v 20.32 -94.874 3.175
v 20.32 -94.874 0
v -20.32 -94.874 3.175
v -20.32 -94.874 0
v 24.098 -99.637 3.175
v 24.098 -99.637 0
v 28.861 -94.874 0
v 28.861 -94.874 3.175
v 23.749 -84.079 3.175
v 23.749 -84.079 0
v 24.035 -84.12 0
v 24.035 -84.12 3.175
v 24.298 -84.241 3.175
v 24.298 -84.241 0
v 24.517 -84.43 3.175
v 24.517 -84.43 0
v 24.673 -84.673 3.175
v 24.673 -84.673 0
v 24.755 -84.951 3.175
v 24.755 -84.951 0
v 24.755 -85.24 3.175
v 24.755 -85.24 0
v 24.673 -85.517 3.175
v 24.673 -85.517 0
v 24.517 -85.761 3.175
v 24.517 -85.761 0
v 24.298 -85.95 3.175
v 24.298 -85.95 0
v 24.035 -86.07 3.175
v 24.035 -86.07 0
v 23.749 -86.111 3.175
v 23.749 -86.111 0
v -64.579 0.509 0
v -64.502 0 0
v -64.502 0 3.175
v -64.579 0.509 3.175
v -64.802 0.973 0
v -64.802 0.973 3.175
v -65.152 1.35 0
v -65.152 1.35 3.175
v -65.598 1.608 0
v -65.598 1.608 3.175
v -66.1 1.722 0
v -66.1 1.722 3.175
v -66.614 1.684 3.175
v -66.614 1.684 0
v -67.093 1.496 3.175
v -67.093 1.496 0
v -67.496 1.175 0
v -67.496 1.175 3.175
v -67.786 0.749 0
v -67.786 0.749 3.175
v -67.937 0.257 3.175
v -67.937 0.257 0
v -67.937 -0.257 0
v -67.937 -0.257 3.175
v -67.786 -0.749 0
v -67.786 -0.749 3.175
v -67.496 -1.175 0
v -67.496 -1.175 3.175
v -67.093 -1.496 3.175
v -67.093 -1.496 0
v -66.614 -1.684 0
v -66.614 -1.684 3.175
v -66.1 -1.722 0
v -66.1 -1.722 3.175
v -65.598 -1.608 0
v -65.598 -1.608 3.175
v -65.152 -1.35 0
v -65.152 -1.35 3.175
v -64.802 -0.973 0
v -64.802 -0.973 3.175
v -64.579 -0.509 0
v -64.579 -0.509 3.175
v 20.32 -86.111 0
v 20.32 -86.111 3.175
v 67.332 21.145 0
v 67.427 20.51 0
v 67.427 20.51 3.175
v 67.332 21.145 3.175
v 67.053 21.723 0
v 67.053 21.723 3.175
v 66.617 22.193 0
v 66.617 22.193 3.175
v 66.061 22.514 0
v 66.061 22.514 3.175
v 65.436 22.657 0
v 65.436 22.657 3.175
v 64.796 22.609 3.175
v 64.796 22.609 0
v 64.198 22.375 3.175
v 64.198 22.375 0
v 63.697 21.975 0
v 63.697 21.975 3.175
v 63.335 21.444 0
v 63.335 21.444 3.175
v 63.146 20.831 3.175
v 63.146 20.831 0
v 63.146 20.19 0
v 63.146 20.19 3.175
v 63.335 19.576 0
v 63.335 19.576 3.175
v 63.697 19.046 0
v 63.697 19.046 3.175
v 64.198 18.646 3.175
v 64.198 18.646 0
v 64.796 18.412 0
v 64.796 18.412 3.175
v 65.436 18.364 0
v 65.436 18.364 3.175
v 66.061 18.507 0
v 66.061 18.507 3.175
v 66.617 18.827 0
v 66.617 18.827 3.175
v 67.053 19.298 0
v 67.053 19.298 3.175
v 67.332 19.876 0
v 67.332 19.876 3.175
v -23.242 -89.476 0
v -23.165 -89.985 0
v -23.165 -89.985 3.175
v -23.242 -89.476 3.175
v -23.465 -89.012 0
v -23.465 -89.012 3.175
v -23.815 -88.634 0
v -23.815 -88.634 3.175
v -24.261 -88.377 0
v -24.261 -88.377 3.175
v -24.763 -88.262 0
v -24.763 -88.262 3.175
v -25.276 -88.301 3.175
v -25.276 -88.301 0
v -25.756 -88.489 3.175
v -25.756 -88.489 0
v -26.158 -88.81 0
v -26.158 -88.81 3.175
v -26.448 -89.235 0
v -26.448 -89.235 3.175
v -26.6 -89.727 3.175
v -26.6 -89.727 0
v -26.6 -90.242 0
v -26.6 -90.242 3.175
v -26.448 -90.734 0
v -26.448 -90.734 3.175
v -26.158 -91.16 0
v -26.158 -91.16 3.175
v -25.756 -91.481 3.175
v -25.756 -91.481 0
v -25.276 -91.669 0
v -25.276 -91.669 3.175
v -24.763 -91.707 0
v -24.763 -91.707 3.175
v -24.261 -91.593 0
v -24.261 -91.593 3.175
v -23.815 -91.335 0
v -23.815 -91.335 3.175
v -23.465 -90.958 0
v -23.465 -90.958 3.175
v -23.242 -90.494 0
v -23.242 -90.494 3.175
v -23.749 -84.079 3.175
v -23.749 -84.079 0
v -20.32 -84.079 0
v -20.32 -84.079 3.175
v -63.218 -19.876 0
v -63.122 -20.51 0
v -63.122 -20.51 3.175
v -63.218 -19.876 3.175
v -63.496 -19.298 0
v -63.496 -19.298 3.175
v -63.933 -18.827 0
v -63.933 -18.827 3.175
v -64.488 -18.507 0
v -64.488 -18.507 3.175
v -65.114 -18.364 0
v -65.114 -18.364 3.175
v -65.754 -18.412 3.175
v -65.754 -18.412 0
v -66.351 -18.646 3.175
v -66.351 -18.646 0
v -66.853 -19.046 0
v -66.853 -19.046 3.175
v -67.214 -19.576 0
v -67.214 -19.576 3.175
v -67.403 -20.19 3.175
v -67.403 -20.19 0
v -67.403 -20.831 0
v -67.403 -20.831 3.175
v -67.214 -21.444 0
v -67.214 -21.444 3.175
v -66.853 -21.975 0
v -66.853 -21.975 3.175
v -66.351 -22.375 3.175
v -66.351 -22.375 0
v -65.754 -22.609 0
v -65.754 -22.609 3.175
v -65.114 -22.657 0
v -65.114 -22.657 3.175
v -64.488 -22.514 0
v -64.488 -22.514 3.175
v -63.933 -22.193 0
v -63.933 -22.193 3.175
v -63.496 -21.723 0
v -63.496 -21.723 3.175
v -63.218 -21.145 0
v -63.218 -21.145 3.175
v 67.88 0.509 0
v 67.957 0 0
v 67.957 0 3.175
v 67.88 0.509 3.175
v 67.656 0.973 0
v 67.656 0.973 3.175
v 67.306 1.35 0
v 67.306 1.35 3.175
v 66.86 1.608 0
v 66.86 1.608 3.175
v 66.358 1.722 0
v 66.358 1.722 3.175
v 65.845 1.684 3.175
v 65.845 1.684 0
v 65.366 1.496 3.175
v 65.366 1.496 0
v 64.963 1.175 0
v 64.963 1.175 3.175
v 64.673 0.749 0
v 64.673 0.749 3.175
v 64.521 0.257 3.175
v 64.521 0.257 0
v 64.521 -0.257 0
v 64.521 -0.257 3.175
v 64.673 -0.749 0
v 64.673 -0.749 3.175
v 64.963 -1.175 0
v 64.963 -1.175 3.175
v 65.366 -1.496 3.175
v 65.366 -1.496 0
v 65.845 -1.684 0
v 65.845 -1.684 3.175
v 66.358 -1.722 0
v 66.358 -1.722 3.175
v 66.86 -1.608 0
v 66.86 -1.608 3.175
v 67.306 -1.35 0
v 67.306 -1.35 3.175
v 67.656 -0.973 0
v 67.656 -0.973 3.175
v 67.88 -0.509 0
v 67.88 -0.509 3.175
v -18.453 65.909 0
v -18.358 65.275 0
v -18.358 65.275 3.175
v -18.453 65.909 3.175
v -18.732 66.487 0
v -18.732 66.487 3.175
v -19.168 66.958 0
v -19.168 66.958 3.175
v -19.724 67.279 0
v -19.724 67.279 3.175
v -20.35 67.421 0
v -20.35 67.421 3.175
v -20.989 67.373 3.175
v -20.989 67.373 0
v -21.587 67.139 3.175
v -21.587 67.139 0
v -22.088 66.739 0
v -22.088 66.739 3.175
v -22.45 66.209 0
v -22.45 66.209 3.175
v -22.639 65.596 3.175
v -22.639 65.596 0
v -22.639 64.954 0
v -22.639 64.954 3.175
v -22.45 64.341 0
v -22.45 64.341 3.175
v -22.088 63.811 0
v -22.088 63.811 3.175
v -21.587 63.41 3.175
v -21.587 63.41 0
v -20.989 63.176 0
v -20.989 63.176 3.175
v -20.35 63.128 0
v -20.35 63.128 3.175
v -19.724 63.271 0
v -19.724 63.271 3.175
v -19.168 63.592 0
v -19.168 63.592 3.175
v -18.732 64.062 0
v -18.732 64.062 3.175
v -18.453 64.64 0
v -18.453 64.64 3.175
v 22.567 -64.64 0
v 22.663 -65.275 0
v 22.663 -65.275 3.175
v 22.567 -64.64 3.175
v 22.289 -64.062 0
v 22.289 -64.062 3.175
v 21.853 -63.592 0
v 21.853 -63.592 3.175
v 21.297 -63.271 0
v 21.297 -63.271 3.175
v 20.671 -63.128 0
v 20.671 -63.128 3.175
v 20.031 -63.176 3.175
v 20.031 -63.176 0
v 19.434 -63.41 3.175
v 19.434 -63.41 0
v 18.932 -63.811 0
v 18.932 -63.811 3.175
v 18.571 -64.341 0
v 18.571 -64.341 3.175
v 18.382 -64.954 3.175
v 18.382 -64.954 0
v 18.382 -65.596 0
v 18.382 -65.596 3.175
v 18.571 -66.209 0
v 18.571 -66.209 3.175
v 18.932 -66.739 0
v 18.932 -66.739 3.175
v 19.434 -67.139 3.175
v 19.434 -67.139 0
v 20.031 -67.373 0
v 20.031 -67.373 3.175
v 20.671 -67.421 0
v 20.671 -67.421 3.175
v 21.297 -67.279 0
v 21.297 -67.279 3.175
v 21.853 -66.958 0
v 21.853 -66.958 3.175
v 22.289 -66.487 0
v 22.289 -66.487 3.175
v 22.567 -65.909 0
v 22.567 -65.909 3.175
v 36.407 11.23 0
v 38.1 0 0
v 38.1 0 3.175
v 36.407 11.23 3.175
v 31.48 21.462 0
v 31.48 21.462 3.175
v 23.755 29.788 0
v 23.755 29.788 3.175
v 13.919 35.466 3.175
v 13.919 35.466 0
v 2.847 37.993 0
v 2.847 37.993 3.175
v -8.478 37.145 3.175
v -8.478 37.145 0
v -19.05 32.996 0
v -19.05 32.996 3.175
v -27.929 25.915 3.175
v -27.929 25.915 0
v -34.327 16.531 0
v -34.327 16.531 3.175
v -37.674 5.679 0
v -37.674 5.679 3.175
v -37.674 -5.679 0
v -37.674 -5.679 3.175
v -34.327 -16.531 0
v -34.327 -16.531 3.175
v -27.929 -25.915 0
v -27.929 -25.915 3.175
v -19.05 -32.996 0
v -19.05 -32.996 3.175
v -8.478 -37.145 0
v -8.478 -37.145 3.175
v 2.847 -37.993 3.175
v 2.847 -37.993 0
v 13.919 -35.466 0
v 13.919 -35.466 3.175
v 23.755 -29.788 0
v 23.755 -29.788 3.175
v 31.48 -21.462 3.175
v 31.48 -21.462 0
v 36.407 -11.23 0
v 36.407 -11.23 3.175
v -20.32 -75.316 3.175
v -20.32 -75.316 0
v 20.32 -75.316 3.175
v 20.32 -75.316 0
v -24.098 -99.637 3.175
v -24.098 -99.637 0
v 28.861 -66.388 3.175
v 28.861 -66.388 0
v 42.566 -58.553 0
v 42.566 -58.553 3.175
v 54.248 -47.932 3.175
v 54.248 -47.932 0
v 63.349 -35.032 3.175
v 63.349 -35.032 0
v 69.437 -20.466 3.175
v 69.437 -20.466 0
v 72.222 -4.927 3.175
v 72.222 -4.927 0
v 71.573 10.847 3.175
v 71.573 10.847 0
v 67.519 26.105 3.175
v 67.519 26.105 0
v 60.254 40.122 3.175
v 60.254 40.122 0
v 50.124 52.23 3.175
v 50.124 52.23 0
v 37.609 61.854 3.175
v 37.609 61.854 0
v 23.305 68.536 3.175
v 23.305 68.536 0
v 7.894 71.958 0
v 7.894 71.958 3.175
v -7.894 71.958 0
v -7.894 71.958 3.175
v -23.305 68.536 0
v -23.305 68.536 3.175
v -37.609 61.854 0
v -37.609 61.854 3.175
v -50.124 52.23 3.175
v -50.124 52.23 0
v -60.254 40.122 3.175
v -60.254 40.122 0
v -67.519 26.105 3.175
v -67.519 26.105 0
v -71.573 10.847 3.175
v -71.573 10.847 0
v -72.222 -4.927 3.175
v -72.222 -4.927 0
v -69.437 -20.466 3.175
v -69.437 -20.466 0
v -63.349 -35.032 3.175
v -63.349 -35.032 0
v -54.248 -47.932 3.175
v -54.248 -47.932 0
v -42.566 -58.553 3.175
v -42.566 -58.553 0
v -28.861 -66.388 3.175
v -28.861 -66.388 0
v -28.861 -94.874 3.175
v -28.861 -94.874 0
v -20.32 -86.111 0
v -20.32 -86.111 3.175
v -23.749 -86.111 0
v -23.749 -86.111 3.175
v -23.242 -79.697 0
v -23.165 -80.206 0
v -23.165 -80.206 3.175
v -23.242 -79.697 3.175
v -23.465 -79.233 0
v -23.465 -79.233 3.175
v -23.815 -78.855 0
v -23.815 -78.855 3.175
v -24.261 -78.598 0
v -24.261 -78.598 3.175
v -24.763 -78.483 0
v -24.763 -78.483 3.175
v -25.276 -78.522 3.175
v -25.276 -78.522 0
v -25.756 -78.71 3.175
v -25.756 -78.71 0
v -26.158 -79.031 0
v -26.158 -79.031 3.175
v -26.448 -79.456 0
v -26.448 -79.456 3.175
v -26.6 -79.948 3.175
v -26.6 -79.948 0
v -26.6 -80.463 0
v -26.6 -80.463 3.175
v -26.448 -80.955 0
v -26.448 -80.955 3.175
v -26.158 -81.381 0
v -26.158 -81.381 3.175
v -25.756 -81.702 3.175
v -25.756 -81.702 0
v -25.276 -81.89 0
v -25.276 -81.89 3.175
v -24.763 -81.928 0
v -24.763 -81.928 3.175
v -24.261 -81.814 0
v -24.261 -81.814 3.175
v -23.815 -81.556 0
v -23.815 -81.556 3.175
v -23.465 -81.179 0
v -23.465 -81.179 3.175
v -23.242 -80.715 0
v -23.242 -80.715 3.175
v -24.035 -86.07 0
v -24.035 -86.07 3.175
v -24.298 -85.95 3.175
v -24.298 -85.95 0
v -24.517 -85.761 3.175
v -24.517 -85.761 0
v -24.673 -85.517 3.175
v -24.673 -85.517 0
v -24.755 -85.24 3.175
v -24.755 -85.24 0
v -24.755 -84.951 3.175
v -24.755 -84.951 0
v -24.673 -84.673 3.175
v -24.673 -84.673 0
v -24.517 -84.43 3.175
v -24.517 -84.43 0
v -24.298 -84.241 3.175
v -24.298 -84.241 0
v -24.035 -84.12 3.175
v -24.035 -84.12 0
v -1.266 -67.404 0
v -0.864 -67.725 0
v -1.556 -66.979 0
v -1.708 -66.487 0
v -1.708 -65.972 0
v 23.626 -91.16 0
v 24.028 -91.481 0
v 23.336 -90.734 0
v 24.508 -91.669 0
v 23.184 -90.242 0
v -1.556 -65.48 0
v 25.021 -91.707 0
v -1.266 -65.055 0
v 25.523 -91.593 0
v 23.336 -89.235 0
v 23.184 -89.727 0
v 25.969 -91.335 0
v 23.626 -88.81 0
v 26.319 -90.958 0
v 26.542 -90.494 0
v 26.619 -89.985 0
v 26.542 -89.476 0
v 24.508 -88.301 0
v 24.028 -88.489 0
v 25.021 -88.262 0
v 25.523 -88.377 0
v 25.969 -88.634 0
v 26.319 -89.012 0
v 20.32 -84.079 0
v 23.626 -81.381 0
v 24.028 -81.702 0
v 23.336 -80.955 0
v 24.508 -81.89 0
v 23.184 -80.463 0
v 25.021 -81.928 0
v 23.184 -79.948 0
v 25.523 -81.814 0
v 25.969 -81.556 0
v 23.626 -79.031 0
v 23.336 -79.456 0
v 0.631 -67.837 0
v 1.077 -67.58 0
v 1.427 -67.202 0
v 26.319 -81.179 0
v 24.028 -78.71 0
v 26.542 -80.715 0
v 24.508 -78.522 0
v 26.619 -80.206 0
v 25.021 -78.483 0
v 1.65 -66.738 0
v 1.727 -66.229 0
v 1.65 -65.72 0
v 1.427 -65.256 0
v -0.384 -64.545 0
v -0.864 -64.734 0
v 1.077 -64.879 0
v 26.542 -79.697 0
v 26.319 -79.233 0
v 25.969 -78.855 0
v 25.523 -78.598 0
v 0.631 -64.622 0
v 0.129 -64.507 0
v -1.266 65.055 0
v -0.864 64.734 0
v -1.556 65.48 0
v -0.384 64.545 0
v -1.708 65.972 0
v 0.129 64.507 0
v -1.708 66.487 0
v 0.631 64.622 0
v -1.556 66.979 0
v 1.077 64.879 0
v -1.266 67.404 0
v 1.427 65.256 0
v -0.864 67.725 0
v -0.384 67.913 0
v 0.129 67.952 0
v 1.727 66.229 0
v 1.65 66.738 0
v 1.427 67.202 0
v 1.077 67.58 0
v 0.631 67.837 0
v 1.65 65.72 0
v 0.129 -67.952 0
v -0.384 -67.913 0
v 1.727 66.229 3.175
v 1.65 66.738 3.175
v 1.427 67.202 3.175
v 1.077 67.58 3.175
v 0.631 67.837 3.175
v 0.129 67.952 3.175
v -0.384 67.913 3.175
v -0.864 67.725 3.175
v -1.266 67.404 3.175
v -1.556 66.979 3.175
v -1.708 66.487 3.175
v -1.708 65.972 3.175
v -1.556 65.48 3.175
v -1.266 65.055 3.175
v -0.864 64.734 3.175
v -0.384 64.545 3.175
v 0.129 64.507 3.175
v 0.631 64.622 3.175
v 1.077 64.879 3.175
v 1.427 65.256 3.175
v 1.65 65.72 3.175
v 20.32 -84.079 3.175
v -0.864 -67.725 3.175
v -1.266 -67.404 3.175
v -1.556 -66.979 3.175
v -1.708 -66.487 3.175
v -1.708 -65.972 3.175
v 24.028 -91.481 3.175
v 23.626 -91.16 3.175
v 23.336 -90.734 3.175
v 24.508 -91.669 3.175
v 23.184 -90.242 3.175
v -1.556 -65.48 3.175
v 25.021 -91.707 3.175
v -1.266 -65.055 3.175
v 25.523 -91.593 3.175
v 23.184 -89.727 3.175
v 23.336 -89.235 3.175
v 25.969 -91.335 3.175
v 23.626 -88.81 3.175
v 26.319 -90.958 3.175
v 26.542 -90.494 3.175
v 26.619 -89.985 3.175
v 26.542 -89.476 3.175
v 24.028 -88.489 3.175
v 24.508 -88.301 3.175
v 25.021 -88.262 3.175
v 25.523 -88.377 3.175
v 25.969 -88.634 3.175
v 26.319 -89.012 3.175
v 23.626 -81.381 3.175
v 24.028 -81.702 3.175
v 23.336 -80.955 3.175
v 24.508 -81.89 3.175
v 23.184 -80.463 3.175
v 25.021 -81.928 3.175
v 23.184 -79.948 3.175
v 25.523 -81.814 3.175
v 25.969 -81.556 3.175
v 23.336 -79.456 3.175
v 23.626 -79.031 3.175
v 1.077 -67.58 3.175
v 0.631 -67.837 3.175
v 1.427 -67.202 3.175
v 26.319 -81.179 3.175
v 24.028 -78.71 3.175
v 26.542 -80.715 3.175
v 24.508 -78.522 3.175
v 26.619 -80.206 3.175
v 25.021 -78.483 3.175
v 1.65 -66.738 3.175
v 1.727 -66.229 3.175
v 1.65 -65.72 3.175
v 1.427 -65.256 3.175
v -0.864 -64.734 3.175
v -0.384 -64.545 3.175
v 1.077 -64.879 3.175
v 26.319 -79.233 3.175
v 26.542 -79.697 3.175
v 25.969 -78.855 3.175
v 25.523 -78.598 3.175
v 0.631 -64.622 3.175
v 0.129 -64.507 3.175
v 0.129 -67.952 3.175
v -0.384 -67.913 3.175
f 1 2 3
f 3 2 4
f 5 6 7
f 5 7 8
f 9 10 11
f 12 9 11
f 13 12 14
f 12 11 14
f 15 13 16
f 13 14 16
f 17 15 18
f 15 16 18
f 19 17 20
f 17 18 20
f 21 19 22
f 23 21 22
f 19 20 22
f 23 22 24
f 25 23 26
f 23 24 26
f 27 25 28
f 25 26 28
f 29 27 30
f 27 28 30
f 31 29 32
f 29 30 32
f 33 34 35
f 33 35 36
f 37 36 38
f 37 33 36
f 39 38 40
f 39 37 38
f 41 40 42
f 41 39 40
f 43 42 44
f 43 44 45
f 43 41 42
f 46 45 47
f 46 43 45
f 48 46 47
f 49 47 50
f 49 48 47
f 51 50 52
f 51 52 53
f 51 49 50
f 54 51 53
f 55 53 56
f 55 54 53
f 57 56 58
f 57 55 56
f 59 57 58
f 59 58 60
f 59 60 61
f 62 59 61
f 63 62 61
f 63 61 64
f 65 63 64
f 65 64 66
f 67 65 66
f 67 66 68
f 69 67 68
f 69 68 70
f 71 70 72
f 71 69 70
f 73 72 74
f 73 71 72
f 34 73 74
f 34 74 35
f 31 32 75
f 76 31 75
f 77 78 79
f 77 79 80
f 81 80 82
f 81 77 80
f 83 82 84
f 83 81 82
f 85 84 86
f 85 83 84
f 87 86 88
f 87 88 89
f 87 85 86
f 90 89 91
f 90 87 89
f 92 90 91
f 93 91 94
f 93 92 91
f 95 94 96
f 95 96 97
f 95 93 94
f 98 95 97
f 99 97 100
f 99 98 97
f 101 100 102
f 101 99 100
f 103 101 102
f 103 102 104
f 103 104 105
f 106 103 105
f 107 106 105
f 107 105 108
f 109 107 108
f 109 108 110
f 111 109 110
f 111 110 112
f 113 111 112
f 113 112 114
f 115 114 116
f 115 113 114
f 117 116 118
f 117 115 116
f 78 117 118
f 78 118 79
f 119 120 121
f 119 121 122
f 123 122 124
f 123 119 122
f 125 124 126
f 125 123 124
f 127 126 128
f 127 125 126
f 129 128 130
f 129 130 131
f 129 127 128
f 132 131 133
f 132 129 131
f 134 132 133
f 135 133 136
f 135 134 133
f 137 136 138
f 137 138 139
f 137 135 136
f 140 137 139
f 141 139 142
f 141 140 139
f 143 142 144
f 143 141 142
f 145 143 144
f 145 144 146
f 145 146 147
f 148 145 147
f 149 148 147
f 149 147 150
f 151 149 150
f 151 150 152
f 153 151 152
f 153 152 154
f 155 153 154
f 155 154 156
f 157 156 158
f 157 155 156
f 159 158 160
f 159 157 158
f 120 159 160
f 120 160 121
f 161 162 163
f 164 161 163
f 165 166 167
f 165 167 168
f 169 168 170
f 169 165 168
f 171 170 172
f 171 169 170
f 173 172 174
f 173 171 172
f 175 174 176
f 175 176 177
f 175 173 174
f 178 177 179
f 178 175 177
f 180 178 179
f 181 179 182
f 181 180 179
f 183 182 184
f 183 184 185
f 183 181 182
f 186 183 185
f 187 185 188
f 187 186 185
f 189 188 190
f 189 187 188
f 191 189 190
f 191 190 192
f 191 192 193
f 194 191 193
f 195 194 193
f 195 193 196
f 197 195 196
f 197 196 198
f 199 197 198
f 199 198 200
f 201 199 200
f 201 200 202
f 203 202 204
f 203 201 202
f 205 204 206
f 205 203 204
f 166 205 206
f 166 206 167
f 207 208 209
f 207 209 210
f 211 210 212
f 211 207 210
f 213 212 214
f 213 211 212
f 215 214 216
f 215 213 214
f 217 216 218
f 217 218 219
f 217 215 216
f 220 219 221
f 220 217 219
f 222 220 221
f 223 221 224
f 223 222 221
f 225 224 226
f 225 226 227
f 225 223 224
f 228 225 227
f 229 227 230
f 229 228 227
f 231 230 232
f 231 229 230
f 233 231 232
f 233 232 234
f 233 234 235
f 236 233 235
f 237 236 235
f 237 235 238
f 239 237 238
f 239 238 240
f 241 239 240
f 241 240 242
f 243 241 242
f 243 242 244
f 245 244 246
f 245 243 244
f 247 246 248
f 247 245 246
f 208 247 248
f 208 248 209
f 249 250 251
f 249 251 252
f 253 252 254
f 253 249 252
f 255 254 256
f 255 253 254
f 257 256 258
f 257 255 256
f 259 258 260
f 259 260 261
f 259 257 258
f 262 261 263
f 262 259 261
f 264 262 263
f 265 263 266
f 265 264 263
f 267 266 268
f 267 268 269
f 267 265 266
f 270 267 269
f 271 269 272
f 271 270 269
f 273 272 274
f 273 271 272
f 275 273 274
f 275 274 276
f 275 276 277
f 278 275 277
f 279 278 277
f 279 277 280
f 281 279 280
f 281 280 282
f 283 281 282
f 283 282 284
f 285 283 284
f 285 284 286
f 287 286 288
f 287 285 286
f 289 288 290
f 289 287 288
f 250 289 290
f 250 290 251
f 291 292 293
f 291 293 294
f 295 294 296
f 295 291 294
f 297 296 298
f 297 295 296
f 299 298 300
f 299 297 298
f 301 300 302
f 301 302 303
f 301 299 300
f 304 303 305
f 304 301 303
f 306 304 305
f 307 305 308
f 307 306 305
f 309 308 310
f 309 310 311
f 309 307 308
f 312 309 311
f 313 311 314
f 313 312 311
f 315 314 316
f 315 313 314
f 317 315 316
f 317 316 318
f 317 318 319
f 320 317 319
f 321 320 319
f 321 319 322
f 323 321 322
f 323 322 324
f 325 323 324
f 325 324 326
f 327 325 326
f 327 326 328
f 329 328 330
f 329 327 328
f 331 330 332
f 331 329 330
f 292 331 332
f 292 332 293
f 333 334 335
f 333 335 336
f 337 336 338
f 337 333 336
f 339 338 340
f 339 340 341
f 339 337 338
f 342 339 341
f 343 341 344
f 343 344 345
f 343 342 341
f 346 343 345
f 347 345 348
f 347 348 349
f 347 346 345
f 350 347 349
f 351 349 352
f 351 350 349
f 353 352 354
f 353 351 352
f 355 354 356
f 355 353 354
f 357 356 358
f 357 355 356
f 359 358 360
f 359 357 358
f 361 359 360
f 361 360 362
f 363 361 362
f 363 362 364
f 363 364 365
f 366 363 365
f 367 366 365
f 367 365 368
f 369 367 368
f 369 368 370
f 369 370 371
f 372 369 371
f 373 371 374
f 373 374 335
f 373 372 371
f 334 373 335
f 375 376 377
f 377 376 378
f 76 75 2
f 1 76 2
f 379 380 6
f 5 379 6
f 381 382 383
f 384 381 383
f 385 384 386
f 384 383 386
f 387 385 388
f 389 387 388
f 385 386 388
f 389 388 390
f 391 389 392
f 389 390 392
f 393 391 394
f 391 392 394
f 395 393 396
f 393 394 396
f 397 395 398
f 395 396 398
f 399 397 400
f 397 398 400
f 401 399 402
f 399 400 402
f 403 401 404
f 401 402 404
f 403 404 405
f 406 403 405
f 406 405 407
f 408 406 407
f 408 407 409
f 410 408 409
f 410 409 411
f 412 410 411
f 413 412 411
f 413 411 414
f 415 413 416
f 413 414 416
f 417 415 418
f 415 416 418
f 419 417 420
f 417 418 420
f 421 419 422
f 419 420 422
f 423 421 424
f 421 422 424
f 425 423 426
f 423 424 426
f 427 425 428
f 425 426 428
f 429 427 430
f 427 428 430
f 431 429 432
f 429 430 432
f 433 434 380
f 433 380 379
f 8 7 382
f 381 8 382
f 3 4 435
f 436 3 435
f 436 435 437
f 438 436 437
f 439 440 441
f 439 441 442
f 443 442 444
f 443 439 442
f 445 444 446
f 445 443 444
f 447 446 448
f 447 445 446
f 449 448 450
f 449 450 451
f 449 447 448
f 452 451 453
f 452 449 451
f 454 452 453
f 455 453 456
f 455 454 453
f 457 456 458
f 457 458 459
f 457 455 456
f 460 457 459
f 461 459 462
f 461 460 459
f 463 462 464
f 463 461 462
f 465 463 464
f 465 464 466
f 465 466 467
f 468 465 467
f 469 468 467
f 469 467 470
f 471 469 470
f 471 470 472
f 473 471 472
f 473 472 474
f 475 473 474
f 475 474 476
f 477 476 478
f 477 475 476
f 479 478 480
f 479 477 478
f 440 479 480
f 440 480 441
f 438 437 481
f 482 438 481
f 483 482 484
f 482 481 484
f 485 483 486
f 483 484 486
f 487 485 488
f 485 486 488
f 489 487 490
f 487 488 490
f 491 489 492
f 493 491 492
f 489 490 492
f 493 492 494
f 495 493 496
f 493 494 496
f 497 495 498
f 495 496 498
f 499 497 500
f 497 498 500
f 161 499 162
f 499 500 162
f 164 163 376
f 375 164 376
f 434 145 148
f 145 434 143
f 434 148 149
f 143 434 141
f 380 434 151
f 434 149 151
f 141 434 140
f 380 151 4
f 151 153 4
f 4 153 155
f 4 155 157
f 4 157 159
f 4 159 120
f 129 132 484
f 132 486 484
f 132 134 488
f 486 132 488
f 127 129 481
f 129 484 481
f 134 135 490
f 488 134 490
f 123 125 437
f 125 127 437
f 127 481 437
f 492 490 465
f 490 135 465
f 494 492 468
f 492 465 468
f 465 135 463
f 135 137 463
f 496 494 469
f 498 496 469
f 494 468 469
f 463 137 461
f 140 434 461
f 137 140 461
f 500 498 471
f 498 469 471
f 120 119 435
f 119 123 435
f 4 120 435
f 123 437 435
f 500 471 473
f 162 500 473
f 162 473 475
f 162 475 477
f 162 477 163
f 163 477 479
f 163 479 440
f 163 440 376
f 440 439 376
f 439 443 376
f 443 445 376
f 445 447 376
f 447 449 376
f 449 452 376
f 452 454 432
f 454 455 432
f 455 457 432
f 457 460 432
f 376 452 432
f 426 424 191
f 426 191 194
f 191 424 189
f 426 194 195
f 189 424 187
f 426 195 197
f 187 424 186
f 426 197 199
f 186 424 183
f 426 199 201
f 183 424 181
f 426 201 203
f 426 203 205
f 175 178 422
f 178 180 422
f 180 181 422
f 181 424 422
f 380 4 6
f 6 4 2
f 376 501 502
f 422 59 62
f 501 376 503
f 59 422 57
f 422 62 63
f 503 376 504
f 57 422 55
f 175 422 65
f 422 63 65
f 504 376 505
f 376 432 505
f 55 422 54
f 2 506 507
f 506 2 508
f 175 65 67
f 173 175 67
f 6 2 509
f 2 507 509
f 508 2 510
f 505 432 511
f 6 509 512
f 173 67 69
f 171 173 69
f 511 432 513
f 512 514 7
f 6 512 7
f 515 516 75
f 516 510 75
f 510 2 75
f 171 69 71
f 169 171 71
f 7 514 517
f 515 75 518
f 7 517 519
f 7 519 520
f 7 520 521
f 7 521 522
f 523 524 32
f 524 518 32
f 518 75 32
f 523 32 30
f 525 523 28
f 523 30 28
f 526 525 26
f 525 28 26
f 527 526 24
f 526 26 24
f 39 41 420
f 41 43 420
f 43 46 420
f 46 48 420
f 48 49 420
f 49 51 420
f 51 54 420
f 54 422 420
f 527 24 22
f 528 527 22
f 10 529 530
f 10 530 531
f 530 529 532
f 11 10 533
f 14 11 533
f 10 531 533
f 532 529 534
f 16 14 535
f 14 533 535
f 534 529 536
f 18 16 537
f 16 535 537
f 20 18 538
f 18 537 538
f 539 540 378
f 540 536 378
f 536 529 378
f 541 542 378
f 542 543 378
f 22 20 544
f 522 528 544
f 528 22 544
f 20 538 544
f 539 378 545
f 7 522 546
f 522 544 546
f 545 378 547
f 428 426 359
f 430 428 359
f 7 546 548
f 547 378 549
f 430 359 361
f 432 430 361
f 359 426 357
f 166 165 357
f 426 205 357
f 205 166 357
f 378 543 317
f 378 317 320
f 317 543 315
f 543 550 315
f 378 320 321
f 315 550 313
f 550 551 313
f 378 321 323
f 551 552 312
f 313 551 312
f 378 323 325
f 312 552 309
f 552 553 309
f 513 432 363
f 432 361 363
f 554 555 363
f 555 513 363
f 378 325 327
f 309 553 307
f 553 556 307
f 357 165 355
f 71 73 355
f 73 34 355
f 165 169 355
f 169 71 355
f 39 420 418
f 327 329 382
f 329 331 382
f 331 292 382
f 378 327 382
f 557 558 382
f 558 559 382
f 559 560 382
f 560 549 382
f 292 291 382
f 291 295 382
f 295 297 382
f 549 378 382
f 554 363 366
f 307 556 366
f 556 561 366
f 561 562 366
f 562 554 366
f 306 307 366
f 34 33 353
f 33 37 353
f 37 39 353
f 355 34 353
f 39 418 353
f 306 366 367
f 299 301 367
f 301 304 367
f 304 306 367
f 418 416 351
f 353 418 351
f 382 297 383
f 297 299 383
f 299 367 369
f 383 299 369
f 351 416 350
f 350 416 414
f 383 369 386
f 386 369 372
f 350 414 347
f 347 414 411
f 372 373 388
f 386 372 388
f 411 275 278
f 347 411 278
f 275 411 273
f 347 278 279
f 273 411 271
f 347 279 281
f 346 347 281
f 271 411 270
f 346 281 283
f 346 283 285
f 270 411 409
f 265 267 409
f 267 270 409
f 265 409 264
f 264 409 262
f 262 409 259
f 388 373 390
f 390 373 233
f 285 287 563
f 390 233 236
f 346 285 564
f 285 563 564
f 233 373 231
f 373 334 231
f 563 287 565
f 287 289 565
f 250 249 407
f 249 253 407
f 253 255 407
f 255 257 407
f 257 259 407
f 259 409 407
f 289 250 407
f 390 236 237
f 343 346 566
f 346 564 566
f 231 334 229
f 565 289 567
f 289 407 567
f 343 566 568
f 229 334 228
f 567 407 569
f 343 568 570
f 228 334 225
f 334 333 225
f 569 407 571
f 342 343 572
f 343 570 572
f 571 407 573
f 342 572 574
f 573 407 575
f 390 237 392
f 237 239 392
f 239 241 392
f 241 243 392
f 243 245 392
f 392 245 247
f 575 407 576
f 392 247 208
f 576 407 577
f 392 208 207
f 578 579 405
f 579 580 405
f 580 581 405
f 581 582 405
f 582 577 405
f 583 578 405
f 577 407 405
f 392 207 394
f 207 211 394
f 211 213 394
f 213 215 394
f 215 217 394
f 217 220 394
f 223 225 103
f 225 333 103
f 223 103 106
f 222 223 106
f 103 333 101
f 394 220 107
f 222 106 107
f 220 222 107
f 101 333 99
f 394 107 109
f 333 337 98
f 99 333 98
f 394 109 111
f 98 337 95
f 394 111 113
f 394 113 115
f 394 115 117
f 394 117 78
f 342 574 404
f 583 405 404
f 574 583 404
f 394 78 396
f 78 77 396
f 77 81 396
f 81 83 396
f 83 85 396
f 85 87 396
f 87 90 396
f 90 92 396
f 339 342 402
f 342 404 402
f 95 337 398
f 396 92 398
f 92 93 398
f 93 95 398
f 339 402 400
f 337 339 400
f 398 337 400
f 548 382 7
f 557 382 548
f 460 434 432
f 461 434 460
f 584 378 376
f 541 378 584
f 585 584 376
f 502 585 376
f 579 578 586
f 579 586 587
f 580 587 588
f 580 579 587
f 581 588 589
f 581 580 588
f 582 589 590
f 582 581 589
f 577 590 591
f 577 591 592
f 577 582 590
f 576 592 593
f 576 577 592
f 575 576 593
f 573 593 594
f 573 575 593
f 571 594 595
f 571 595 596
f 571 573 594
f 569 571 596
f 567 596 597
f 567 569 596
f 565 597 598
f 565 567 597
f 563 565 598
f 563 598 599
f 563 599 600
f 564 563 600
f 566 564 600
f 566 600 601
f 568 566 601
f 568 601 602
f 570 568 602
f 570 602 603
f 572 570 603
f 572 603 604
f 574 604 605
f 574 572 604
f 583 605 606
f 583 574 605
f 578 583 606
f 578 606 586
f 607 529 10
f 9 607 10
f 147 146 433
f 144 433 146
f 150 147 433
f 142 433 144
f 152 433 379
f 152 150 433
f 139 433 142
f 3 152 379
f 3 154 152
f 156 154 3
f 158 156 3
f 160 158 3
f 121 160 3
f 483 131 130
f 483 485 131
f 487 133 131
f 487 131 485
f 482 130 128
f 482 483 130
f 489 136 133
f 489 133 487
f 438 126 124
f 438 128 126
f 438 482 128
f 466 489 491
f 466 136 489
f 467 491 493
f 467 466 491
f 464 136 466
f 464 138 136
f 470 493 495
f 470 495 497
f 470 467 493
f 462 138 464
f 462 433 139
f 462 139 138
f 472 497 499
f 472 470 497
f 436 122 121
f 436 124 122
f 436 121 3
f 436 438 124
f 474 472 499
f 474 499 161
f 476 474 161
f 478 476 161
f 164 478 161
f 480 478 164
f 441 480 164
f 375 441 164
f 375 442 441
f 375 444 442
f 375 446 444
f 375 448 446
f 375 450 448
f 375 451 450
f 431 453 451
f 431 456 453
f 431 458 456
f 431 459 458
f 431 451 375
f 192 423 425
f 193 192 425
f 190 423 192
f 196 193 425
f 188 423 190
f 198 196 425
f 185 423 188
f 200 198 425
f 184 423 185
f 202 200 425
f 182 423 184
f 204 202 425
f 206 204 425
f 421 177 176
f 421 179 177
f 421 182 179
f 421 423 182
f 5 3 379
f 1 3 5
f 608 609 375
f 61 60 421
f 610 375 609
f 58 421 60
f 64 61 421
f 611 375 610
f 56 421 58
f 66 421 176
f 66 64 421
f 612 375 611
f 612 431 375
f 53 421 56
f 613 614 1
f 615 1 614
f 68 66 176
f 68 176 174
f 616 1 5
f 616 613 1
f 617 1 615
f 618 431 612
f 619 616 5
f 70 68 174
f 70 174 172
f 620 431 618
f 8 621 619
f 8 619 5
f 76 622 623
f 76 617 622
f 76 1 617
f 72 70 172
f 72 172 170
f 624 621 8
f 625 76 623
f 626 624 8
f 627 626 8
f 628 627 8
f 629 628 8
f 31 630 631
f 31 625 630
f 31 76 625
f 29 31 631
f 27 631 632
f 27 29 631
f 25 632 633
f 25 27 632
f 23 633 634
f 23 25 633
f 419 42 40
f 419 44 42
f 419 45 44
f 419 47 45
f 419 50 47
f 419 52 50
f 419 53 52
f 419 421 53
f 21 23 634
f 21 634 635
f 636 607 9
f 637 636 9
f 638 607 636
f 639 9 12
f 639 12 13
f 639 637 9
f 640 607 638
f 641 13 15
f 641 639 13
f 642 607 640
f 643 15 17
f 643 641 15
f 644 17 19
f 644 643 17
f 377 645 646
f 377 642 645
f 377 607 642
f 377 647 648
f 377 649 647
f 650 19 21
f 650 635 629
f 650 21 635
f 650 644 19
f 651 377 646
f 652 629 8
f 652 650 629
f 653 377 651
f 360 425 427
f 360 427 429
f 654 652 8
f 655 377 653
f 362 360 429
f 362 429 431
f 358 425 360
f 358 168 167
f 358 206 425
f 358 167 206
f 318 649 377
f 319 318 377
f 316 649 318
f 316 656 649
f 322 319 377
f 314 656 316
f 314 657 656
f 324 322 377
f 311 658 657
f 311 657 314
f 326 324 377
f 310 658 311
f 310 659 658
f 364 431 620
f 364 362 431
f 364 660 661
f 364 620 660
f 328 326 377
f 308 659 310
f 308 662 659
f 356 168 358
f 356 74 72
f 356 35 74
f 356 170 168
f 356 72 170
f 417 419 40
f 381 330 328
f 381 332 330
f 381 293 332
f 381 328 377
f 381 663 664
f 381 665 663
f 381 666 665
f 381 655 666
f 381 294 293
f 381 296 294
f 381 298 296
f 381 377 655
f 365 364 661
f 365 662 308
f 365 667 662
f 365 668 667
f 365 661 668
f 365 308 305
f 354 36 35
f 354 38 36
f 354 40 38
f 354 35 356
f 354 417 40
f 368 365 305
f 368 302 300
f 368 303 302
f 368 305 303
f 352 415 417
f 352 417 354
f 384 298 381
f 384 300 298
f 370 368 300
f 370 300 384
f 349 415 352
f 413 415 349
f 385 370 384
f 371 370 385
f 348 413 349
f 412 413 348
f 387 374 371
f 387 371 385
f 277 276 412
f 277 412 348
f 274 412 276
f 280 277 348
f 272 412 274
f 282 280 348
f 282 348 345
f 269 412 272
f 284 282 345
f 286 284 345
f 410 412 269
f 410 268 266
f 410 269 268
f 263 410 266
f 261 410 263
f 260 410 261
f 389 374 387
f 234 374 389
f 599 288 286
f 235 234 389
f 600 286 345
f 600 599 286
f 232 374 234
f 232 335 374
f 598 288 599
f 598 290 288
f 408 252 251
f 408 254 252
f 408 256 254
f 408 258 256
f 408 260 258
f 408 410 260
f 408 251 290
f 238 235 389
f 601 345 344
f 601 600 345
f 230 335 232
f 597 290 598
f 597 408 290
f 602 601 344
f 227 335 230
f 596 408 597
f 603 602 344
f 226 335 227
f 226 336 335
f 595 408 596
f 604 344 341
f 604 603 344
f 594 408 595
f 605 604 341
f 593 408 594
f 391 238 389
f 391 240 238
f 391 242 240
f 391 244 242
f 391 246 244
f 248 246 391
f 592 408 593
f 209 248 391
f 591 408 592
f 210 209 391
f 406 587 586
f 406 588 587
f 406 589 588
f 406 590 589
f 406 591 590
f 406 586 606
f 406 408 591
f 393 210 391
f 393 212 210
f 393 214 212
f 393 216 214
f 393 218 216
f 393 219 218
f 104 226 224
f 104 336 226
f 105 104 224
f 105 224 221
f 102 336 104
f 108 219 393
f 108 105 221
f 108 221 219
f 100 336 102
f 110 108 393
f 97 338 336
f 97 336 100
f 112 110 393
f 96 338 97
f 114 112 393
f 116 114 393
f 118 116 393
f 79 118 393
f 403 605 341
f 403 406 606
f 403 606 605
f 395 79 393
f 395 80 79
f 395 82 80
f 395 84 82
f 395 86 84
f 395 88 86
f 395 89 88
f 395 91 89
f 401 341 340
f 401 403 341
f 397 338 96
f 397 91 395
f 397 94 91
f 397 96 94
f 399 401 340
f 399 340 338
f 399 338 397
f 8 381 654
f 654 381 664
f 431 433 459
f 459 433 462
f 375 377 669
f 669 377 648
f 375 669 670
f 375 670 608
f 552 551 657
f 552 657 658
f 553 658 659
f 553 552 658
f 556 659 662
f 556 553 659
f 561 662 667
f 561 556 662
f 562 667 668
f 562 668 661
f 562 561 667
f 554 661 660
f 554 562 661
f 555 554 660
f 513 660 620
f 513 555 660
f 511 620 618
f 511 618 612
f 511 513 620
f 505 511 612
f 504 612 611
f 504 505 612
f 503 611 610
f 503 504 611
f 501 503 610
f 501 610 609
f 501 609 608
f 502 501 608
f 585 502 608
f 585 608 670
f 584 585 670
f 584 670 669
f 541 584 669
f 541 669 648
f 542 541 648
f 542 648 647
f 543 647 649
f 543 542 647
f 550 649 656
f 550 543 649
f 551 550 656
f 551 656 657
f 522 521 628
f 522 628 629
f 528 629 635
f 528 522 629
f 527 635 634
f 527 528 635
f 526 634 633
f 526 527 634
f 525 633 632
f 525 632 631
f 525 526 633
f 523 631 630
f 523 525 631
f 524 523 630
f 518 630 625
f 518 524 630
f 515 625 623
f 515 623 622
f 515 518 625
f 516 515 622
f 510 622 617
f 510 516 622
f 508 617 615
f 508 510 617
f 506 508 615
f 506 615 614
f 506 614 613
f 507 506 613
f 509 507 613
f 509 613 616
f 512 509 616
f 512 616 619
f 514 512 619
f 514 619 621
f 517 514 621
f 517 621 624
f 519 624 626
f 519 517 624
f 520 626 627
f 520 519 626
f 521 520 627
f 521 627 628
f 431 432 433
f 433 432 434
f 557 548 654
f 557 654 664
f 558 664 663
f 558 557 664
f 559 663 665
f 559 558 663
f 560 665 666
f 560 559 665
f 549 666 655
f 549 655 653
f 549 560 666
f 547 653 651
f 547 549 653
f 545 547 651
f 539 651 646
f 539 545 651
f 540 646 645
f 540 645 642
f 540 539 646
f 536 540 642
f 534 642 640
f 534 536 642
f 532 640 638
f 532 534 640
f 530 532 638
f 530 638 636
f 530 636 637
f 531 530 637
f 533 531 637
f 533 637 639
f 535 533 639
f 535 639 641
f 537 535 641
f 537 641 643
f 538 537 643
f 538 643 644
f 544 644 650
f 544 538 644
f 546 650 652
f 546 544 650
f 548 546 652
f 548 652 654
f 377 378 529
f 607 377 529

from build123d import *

# Parameters (mm, degrees)
F0_R     = 1.7272
F0_R_2   = 2.15265
F0_R_3   = 38.1
F1_DEPTH = 3.175
F2_SIZE  = 4.7625


# Not quite as in the source:
# - a feature names something its author has since deleted; it is built from what else it names


with BuildPart() as f1:
    # F0 (on Top) → F1 (new body)
    with BuildSketch(Plane.XY):
        with BuildLine():
            Line((28.86075, -99.6367724936), (28.86075, -66.3880200747))
            ThreePointArc((28.86075, -66.3880200747), (0, 72.39), (-28.86075, -66.3880200747))
            Line((-28.86075, -66.3880200747), (-28.86075, -99.6367724936))
            Line((-28.86075, -99.6367724936), (28.86075, -99.6367724936))
        make_face()
        with Locations((-24.892, -89.9847724936)):
            Circle(F0_R, mode=Mode.SUBTRACT)
        with Locations((-24.892, -80.2057724936)):
            Circle(F0_R, mode=Mode.SUBTRACT)
        with Locations((-65.2747423649, -20.5103744665)):
            Circle(F0_R_2, mode=Mode.SUBTRACT)
        with BuildLine():
            Line((-20.32, -94.8742724936), (-20.32, -86.1112724936))
            Line((-20.32, -86.1112724936), (-23.749, -86.1112724936))
            ThreePointArc((-23.749, -86.1112724936), (-24.765, -85.0952724936), (-23.749, -84.0792724936))
            Line((-23.749, -84.0792724936), (-20.32, -84.0792724936))
            Line((-20.32, -84.0792724936), (-20.32, -75.3162724936))
            Line((-20.32, -75.3162724936), (20.32, -75.3162724936))
            Line((20.32, -75.3162724936), (20.32, -84.0792724936))
            Line((20.32, -84.0792724936), (23.749, -84.0792724936))
            ThreePointArc((23.749, -84.0792724936), (24.765, -85.0952724936), (23.749, -86.1112724936))
            Line((23.749, -86.1112724936), (20.32, -86.1112724936))
            Line((20.32, -86.1112724936), (20.32, -94.8742724936))
            Line((20.32, -94.8742724936), (-20.32, -94.8742724936))
        make_face(mode=Mode.SUBTRACT)
        with Locations((24.892, -89.9847724936)):
            Circle(F0_R, mode=Mode.SUBTRACT)
        with Locations((24.892, -80.2057724936)):
            Circle(F0_R, mode=Mode.SUBTRACT)
        with Locations((0, -66.2293888929)):
            Circle(F0_R, mode=Mode.SUBTRACT)
        with Locations((20.5103744665, -65.2747423649)):
            Circle(F0_R_2, mode=Mode.SUBTRACT)
        with Locations((-66.2293888929, 0)):
            Circle(F0_R, mode=Mode.SUBTRACT)
        with Locations((-20.5103744665, 65.2747423649)):
            Circle(F0_R_2, mode=Mode.SUBTRACT)
        Circle(F0_R_3, mode=Mode.SUBTRACT)
        with Locations((66.2293888929, 0)):
            Circle(F0_R, mode=Mode.SUBTRACT)
        with Locations((65.2747423649, 20.5103744665)):
            Circle(F0_R_2, mode=Mode.SUBTRACT)
        with Locations((0, 66.2293888929)):
            Circle(F0_R, mode=Mode.SUBTRACT)
    extrude(amount=F1_DEPTH)

    # F2
    f2_edges = [f1.edges().sort_by_distance(p)[0] for p in [
        (-28.86075, -99.636772, 1.5875),
        (28.86075, -99.636772, 1.5875),
    ]]
    chamfer(f2_edges, length=F2_SIZE)


solid = f1.part
